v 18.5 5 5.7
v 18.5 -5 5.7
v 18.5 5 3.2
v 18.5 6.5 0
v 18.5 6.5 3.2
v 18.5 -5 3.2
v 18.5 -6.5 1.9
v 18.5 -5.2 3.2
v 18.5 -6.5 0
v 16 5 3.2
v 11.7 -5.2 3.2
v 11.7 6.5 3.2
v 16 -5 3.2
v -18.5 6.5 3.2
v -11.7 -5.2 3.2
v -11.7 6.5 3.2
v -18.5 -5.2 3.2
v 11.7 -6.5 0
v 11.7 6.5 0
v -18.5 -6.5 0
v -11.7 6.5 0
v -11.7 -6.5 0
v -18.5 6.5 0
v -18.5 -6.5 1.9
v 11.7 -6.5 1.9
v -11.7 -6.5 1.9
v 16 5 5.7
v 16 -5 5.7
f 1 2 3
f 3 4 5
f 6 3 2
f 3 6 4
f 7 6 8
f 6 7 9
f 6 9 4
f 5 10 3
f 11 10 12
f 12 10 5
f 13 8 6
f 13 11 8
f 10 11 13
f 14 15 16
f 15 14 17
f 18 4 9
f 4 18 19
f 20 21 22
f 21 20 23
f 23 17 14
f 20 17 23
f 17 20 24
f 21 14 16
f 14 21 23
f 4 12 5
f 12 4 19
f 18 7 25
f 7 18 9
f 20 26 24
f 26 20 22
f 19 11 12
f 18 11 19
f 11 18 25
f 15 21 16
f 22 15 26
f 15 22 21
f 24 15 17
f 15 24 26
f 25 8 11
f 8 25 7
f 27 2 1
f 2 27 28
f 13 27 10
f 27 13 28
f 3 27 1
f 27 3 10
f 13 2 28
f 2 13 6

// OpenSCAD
// ===================================================================
// MG90S 舵机免螺丝滑入式自锁压板 (Slide-in Retention C-Clamp)
// 100% 纯 3D 打印机械互锁结构，免螺栓螺母，徒手推入锁死
// ===================================================================

$fn = 30;

module servo_clamp() {
    // 整体尺寸: 38.0mm (长) x 14.0mm (宽) x 3.5mm (厚)
    // 两端带 45° 燕尾滑动倒角滑条，中间留出舵机主体阶梯避让通孔
    color([0.95, 0.45, 0.15]) { // 醒目橙色工程塑料
        difference() {
            // 1. 压板主横梁 (厚 3.5mm)
            translate([-37.0/2, -13.0/2, 0])
                cube([37.0, 13.0, 3.2]);
            
            // 2. 中间齿轮塔避让方孔 (长 23.4mm, 宽 12.6mm)
            // 仅两端各留出 6.8mm 实心板材紧紧压住舵机固定耳 (Ears)
            translate([-23.4/2, -14.0/2, -1])
                cube([23.4, 14.0, 6]);

            // 3. 两端滑轨外倒角 (斜向 45° 导轨咬合面)
            translate([-37.0/2, -13.0/2 - 0.1, 1.8])
                rotate([45, 0, 0])
                cube([37.0, 5, 5]);
            translate([-37.0/2, 13.0/2 + 0.1, 1.8])
                rotate([-45, 0, 0])
                cube([37.0, 5, 5]);
        }

        // 4. 末端阻尼防滑推出手柄 (Push/Pull Tab)
        translate([37.0/2 - 2.5, -5.0, 3.2])
            cube([2.5, 10.0, 2.5]);
    }
}

servo_clamp();
